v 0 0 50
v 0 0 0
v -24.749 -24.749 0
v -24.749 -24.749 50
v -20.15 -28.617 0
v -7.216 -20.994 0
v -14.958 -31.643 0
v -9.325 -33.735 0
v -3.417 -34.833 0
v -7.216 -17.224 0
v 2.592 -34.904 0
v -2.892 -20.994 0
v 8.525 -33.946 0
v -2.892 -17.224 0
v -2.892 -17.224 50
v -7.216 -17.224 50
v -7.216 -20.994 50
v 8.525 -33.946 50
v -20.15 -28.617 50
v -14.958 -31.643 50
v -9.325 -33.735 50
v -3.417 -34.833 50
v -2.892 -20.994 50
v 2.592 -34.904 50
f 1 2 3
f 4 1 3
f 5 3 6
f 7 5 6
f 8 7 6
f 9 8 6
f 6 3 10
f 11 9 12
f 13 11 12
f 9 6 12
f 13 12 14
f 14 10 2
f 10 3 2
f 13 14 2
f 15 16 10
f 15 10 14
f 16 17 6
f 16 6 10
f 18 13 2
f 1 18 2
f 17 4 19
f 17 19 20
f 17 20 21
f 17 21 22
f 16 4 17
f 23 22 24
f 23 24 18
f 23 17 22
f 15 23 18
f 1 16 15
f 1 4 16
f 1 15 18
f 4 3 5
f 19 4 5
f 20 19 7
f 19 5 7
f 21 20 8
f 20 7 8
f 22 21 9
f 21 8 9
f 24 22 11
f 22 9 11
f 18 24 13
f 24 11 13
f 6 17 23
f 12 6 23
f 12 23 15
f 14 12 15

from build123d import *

# Parameters (mm, degrees)
IZIM1_R                     = 1.5
Y_KSEKLIK_EKSTR_ZYON1_DEPTH = 50
IZIM2_W                     = 4.324361658
IZIM2_H                     = 3.770180851
KES_EKSTR_ZYON1_DEPTH       = 50


with BuildPart() as part:
    # Çizim1 → Yükseklik-Ekstrüzyon1 (new body)
    with BuildSketch(Plane.XY):
        with BuildLine():
            Line((0, 0), (-24.748737342, -24.748737342))
            ThreePointArc((-24.748737342, -24.748737342), (-9.324883978, -33.734945365), (8.524559631, -33.946014245))
            Line((8.524559631, -33.946014245), (0, 0))
        make_face()
        with Locations((-5.054296408, -19.108631106)):
            Circle(IZIM1_R, mode=Mode.SUBTRACT)
    extrude(amount=Y_KSEKLIK_EKSTR_ZYON1_DEPTH)

    # Çizim2 → Kes-Ekstrüzyon1 (cut)
    with BuildSketch(Plane.XY.offset(50)):
        with Locations((-5.054296408, -19.108631106)):
            Rectangle(IZIM2_W, IZIM2_H)
    extrude(amount=-KES_EKSTR_ZYON1_DEPTH, mode=Mode.SUBTRACT)


solid = part.part
